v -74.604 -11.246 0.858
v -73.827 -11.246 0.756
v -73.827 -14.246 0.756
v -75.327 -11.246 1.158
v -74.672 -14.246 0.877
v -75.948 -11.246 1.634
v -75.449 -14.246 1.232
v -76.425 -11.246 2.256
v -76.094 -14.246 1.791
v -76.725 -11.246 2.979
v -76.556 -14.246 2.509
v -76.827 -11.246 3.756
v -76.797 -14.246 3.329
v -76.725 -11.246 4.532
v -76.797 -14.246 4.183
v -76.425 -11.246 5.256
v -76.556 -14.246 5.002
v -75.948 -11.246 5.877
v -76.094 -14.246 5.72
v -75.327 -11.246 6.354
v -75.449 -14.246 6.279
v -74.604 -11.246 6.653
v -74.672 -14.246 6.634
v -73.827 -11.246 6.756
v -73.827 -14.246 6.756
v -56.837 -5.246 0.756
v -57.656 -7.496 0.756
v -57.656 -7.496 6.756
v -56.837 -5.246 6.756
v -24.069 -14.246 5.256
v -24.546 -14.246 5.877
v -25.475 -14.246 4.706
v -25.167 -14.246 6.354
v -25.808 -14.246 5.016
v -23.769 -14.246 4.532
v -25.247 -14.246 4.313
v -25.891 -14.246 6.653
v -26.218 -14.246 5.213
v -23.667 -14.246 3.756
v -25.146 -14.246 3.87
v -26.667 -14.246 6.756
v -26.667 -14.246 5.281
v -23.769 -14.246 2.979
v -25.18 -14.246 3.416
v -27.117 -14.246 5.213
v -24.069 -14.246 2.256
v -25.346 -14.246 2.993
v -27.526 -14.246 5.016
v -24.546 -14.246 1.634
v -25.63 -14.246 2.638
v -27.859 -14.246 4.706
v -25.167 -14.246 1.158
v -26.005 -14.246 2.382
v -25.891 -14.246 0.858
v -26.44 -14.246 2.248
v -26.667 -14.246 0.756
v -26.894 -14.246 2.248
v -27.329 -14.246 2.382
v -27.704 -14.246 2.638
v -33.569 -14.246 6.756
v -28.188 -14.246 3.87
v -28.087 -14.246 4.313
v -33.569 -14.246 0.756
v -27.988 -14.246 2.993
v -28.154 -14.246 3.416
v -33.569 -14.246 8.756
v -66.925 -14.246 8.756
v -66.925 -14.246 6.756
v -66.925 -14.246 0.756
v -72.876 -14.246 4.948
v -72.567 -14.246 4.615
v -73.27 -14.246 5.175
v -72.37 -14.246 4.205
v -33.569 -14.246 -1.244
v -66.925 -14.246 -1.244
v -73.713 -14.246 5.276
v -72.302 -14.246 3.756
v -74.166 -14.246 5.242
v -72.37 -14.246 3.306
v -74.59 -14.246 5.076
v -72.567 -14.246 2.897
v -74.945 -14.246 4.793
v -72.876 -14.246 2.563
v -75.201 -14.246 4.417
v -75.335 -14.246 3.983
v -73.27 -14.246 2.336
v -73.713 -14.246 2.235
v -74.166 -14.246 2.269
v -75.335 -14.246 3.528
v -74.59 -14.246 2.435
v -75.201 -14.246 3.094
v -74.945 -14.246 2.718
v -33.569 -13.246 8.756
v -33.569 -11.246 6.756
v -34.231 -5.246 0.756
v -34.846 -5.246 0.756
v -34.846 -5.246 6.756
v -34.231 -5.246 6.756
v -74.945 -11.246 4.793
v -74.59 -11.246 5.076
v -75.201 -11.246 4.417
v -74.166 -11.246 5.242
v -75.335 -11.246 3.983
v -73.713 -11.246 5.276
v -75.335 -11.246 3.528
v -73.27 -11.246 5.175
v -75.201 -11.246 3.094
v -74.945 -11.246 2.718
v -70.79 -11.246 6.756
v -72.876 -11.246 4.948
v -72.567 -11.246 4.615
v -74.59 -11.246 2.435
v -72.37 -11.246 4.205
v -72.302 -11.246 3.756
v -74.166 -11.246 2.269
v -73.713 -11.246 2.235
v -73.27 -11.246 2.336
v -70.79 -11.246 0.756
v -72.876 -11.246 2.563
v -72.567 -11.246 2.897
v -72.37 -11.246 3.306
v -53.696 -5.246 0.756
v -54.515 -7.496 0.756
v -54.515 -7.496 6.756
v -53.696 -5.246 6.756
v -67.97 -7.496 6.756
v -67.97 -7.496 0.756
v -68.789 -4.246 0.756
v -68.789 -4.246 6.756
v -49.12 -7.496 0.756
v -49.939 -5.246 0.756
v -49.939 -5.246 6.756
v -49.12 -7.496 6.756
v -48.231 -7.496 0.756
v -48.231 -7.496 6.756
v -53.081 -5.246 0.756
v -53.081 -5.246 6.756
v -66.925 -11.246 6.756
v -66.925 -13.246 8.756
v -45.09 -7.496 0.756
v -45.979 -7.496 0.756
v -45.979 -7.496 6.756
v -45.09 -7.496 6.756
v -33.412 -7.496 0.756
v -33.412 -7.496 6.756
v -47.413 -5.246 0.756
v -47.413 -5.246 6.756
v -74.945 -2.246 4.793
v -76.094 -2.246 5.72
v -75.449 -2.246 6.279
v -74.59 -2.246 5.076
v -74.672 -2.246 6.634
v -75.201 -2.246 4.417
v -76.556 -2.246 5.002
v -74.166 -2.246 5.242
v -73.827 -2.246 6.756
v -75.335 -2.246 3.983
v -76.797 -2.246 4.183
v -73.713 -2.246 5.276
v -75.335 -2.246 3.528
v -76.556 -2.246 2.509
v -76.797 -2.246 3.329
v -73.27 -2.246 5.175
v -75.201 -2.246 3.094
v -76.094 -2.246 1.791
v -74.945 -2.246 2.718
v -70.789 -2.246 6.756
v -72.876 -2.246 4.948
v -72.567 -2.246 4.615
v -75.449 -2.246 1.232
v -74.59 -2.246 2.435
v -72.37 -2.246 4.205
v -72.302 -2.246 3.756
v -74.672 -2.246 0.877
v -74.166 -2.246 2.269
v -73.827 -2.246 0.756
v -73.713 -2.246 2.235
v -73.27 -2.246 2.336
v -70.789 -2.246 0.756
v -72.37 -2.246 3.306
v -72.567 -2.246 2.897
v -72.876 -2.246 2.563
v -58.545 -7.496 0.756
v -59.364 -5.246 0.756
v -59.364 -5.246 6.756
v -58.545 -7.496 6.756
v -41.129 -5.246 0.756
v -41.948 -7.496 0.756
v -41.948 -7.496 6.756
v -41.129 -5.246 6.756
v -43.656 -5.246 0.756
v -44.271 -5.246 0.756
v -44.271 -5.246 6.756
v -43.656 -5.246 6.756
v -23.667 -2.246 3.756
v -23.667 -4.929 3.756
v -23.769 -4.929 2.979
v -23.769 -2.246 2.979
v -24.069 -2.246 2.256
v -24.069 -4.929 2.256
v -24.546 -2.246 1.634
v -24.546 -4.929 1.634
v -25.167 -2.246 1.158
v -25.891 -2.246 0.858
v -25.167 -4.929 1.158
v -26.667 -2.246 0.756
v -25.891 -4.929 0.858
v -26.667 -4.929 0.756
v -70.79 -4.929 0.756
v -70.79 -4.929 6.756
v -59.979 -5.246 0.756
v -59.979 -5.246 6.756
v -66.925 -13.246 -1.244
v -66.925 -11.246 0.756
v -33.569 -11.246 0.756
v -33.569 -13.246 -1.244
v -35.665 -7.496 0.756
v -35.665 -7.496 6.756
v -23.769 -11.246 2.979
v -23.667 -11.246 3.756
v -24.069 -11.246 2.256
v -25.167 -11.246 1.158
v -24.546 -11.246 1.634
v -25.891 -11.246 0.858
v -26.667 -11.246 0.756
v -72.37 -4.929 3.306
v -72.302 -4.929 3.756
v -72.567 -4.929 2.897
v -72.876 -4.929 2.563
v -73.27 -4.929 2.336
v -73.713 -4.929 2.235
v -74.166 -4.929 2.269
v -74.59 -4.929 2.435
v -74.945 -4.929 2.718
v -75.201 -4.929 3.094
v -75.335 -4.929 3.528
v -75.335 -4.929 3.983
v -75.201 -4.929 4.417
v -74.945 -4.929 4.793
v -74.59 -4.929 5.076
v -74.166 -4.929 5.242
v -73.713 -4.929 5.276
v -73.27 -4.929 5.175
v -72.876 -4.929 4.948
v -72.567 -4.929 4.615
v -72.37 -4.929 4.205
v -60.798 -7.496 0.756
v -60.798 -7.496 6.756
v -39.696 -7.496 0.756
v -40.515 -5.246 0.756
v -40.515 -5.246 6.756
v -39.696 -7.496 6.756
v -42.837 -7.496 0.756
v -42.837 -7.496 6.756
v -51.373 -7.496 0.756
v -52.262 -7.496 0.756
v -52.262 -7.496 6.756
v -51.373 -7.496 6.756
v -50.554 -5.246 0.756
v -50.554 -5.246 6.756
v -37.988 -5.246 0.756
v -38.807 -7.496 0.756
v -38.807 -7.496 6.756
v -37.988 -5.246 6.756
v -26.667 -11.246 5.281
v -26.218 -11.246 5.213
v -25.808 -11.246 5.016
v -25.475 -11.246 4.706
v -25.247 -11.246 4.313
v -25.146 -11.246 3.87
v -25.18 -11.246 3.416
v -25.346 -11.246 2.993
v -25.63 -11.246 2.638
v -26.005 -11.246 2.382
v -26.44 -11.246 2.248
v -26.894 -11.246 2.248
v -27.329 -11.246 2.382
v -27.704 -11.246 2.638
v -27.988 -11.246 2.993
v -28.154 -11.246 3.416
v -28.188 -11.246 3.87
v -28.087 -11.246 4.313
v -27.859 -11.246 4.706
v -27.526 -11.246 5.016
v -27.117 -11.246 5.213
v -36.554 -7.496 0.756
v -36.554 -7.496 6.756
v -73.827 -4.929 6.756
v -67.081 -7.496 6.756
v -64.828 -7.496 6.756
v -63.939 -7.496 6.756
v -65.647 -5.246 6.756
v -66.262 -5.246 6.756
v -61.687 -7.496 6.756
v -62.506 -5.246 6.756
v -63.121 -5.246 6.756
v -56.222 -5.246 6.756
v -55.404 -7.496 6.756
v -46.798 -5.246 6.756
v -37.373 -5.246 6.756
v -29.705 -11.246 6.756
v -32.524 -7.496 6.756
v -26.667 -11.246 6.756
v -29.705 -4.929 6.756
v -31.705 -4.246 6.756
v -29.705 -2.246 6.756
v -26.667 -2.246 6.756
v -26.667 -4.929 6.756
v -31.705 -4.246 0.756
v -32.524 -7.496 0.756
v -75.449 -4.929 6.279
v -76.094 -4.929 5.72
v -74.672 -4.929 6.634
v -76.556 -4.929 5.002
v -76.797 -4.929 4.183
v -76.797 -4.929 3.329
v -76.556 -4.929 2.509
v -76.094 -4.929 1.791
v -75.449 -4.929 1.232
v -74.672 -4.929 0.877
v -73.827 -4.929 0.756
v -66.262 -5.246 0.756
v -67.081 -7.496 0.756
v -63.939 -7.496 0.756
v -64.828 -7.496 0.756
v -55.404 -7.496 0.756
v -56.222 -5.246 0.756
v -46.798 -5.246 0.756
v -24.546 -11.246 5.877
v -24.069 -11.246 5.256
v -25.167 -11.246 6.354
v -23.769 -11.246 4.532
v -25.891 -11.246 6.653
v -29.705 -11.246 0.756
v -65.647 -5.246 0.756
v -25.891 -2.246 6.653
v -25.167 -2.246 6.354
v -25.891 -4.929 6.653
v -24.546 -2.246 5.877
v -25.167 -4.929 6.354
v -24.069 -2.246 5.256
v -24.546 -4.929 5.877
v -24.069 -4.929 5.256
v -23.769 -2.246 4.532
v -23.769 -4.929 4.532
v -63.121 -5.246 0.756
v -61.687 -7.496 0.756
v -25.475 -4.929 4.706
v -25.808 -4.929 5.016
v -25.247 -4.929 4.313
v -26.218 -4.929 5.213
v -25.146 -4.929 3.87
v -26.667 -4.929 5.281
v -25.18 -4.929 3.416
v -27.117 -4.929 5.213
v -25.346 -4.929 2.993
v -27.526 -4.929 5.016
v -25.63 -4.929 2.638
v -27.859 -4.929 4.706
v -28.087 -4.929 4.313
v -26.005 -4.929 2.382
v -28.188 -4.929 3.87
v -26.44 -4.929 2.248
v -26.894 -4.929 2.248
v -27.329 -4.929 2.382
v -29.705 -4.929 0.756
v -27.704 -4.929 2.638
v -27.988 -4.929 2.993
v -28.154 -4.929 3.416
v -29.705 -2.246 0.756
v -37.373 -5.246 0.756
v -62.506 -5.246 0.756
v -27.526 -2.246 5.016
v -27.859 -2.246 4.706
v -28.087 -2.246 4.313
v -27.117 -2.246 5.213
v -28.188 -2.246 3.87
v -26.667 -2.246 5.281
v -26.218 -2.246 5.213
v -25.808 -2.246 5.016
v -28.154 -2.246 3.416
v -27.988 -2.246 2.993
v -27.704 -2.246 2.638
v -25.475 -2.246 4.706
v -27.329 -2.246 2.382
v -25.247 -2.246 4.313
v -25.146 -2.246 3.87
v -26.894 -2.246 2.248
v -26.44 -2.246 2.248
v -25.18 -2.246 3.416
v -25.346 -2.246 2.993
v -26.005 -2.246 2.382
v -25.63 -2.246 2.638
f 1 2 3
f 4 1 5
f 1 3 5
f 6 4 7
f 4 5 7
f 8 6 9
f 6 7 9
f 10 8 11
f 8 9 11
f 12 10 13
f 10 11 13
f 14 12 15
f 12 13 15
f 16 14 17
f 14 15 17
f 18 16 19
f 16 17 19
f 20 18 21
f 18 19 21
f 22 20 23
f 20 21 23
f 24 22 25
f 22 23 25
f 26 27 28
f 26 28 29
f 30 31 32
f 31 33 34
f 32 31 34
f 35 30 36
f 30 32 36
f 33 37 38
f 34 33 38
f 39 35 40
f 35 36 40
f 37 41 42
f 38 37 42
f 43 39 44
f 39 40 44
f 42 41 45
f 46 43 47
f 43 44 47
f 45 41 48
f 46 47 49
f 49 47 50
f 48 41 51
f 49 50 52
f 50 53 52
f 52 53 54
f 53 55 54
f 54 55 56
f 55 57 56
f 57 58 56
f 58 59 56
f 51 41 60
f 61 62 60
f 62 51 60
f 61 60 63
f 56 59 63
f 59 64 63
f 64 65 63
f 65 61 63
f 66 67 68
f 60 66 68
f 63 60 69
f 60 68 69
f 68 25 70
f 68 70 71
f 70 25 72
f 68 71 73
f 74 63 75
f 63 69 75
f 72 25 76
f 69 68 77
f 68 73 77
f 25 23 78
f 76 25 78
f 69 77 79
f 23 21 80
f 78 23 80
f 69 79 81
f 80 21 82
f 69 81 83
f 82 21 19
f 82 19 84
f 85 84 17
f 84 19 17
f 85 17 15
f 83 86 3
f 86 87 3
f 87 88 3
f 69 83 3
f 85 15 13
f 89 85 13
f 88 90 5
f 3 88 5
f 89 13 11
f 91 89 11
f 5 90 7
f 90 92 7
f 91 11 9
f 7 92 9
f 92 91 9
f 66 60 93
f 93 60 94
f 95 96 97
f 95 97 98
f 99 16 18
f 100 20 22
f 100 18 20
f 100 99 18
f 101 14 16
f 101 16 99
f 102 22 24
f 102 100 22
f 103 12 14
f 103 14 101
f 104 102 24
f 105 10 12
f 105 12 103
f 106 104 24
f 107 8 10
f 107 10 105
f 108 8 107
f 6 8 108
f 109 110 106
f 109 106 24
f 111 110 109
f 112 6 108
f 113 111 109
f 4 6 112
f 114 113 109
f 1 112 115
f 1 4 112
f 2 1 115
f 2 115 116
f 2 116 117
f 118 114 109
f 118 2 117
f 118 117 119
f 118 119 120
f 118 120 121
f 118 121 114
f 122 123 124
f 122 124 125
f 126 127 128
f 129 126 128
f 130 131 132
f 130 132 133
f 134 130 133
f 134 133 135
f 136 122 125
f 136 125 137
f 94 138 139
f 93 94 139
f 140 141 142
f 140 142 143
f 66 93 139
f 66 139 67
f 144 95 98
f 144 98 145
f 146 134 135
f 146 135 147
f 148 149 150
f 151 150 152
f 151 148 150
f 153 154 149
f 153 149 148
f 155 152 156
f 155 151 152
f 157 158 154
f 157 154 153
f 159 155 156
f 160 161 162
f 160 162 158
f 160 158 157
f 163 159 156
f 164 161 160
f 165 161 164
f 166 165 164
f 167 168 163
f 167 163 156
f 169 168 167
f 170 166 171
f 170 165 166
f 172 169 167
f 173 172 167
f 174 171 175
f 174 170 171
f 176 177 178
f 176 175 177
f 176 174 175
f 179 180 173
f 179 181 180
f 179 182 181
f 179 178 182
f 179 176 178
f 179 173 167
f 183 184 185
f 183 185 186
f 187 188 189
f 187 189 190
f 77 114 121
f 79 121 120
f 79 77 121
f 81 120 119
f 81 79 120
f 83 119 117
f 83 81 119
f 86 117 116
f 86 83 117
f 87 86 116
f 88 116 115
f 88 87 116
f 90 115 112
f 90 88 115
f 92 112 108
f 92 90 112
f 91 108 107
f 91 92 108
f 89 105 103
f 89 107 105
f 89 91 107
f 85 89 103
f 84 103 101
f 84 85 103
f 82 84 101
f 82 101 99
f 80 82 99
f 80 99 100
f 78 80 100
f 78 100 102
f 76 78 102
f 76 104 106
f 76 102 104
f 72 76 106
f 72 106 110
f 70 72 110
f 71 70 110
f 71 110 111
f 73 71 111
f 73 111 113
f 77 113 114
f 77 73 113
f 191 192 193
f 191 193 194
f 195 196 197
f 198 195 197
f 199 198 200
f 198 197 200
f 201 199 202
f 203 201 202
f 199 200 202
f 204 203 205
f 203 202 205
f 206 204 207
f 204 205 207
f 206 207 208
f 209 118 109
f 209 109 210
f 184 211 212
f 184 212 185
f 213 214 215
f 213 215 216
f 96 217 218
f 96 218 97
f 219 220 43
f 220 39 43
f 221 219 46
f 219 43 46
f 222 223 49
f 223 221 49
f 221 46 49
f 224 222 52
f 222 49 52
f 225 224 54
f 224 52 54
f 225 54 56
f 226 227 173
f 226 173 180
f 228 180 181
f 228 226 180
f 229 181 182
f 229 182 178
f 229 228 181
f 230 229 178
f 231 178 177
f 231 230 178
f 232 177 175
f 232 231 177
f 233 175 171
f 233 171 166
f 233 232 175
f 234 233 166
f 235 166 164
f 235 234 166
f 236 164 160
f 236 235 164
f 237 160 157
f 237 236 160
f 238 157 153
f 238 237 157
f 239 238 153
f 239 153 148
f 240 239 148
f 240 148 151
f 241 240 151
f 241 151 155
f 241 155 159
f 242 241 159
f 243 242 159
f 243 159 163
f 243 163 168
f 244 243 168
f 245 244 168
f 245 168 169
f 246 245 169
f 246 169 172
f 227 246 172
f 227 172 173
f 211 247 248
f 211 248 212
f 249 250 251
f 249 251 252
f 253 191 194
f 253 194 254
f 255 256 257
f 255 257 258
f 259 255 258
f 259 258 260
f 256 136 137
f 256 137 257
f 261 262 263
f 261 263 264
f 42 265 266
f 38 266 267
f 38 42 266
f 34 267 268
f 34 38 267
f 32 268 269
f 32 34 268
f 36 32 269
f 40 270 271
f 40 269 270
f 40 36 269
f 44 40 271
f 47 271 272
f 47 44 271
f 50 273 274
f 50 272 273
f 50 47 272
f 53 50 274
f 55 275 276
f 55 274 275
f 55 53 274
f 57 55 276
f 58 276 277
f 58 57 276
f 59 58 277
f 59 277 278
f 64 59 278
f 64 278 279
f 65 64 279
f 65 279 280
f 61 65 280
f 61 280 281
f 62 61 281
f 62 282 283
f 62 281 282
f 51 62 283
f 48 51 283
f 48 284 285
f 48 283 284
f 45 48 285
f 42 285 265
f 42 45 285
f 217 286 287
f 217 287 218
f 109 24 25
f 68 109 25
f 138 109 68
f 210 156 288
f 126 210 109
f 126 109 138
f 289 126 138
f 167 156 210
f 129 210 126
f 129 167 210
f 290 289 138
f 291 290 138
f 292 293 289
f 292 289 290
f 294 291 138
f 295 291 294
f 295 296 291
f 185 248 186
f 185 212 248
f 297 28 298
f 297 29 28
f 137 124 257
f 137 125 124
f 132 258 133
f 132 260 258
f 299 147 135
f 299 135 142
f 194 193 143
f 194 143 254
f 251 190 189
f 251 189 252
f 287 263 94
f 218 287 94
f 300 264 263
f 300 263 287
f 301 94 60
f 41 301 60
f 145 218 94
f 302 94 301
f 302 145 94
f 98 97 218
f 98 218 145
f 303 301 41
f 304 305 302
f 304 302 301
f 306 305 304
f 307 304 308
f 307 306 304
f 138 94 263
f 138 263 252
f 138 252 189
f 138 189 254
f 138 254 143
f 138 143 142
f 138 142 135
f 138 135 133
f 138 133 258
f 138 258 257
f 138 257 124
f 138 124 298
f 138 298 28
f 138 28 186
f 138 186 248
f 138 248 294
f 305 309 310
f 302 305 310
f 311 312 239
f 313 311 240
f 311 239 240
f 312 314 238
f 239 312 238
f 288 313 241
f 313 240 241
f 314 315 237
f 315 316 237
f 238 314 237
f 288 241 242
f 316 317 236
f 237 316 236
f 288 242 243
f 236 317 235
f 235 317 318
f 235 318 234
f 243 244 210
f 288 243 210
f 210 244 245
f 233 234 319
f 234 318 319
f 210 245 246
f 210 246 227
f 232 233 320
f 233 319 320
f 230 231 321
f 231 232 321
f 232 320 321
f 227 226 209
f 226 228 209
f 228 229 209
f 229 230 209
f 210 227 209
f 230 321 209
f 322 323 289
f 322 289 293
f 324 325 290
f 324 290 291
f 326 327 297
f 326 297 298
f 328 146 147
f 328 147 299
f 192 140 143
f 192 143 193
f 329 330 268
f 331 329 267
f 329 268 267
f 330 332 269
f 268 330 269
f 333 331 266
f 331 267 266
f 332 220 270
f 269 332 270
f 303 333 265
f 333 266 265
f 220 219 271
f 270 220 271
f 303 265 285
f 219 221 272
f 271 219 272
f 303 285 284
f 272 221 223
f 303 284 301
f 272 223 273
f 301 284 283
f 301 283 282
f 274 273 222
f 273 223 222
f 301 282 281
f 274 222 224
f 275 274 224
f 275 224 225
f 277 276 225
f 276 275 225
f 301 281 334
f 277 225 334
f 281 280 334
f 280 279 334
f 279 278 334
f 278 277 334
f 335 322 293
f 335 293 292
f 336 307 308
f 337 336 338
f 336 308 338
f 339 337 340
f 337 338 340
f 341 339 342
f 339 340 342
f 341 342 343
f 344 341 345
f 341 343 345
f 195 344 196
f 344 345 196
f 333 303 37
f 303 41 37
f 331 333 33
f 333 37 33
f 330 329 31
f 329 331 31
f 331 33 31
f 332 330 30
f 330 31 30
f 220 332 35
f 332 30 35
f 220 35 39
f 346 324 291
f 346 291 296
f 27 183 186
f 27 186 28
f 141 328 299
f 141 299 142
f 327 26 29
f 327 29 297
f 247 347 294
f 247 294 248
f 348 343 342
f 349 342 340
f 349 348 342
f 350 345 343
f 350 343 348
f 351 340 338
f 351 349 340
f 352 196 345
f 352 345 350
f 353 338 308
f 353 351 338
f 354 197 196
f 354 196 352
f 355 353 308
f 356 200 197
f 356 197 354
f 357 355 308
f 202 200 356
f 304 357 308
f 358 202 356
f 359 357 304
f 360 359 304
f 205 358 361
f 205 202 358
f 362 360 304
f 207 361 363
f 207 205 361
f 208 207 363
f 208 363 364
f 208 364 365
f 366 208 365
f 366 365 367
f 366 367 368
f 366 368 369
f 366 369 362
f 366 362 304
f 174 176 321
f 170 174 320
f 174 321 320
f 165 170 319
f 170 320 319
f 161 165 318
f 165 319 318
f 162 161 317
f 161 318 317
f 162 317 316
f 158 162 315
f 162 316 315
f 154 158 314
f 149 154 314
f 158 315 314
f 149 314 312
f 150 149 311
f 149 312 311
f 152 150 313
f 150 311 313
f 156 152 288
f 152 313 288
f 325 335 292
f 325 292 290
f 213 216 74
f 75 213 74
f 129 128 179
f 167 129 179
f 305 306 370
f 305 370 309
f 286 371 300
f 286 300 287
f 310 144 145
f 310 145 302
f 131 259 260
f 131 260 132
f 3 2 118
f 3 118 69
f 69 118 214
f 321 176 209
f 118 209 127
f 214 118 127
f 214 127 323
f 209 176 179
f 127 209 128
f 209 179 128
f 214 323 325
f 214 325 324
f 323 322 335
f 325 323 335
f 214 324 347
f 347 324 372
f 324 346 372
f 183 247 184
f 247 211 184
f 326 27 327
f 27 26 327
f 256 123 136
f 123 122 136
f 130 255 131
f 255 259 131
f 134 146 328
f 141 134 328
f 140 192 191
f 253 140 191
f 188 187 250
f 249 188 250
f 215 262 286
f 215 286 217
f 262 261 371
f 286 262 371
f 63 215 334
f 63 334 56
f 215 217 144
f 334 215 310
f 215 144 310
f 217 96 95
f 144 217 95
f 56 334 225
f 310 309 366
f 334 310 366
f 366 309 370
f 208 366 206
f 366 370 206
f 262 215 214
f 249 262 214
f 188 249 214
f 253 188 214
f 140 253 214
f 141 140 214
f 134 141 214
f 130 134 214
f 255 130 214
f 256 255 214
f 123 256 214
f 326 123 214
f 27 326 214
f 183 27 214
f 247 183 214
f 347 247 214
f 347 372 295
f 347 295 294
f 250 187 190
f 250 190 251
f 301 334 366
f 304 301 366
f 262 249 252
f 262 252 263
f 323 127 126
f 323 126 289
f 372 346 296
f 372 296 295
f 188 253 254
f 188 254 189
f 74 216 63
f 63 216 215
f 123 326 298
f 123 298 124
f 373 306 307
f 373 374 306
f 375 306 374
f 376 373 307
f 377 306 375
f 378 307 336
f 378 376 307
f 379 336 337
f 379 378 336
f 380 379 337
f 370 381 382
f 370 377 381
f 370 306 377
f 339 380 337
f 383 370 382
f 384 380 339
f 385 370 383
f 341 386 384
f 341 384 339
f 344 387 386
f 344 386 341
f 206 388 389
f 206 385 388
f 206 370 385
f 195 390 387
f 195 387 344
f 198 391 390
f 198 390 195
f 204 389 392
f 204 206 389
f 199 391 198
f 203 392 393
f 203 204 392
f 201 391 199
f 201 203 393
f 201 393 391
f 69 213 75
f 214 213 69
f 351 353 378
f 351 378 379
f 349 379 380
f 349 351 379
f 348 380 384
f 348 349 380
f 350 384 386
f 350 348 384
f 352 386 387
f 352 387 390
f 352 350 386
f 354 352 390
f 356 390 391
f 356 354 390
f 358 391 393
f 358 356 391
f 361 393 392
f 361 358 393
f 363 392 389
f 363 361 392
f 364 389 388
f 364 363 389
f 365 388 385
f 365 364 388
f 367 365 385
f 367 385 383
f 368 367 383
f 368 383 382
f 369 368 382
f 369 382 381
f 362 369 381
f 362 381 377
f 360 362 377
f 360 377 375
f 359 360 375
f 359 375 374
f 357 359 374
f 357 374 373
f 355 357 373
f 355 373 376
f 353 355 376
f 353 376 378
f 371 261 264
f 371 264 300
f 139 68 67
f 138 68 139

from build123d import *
from build123d.topology import SkipClean

# Parameters (mm, degrees)
BOSS_EXTRUDE1_DEPTH  = 6
SKETCH2_W            = 6
SKETCH2_H            = 6
SKETCH2_R            = 1.525
BOSS_EXTRUDE2_DEPTH  = 3.75
FILLET1_R            = 3
SKETCH4_W            = 33.355842528
SKETCH4_H            = 6
BOSS_EXTRUDE3_DEPTH  = 3
BOSS_EXTRUDE4_DEPTH  = 33.355842528
BOSS_EXTRUDE5_START  = -6.75
SKETCH7_R            = 1.525
BOSS_EXTRUDE5_DEPTH  = 12
SKETCH8_W            = 6
SKETCH8_H            = 5.25
BOSS_EXTRUDE6_DEPTH  = 1.433789
BOSS_EXTRUDE7_REACH  = 51.468
SKETCH11_W           = 6
SKETCH11_H           = 3
MIRROR1_START        = -14.24613882
MIRROR1_OUTLINE_R    = 1.525
MIRROR1_DEPTH        = 12
SKETCH13_W           = 6
SKETCH13_H           = 5.25
BOSS_EXTRUDE8_DEPTH  = 1.434493
BOSS_EXTRUDE9_REACH  = 51.468
SKETCH14_W           = 6
SKETCH14_H           = 3
CHAMFER1_SIZE        = 2
SKETCH15_W           = 7.967920834
SKETCH15_H           = 6.3175
CUT_EXTRUDE1_DEPTH   = 6.25
BOSS_EXTRUDE10_DEPTH = 6


# Read off the part's stored shape, not the designer's step: Mirror1
# Some blends are built 0.0001 mm under size
with BuildPart() as part:
    # Sketch1 → Boss-Extrude1 (new body)
    with BuildSketch(Plane(origin=(0, 0, 0.755649514), x_dir=(-1, 0, 0), z_dir=(0, 0, -1))):
        Polygon((31.089725273, -5.24613882), (30.270792245, -7.49613882), (29.667061326, -7.49613882), (29.667061326, -11.24613882), (70.667061326, -11.24613882), (70.827061326, -11.24613882), (70.827061326, -7.49613882), (70.667061326, -7.49613882), (70.222625956, -7.49613882), (69.403692929, -5.24613882), (68.788837073, -5.24613882), (67.969904045, -7.49613882), (67.081033306, -7.49613882), (66.262100279, -5.24613882), (65.647244423, -5.24613882), (64.828311395, -7.49613882), (63.939440656, -7.49613882), (63.120507629, -5.24613882), (62.505651773, -5.24613882), (61.686718745, -7.49613882), (60.797848006, -7.49613882), (59.978914979, -5.24613882), (59.364059123, -5.24613882), (58.545126095, -7.49613882), (57.656255356, -7.49613882), (56.837322329, -5.24613882), (56.222466473, -5.24613882), (55.403533445, -7.49613882), (54.514662706, -7.49613882), (53.695729679, -5.24613882), (53.080873823, -5.24613882), (52.261940795, -7.49613882), (51.373070056, -7.49613882), (50.554137029, -5.24613882), (49.939281173, -5.24613882), (49.120348145, -7.49613882), (48.231477406, -7.49613882), (47.412544379, -5.24613882), (46.797688523, -5.24613882), (45.978755495, -7.49613882), (45.089884756, -7.49613882), (44.270951729, -5.24613882), (43.656095873, -5.24613882), (42.837162845, -7.49613882), (41.948292106, -7.49613882), (41.129359079, -5.24613882), (40.514503223, -5.24613882), (39.695570195, -7.49613882), (38.806699456, -7.49613882), (37.987766429, -5.24613882), (37.372910573, -5.24613882), (36.553977545, -7.49613882), (35.665106806, -7.49613882), (34.846173779, -5.24613882), (34.231317923, -5.24613882), (33.412384895, -7.49613882), (32.523514156, -7.49613882), (31.704581129, -5.24613882), align=None)
    extrude(amount=-BOSS_EXTRUDE1_DEPTH)

    # Sketch2 → Boss-Extrude2 (add)
    # profile 1 of 2: a face of its own
    with BuildSketch(Plane.XZ.offset(11.24613882)):
        with Locations((-73.827061326, 3.755649514)):
            Rectangle(SKETCH2_W, SKETCH2_H)
        with Locations(Location((-73.827061326, 3.755649514, 0), (0, 0, 270))):
            Circle(SKETCH2_R, mode=Mode.SUBTRACT)
    # profile 2 of 2: a face of its own
    with BuildSketch(Plane.XZ.offset(11.24613882)):
        with Locations((-26.667061326, 3.755649514)):
            Rectangle(SKETCH2_W, SKETCH2_H)
        with Locations(Location((-26.667061326, 3.755649514, 0), (0, 0, 270))):
            Circle(SKETCH2_R, mode=Mode.SUBTRACT)
    extrude(amount=-BOSS_EXTRUDE2_DEPTH)

    # Fillet1
    fillet1_edges = [part.edges().sort_by_distance(p)[0] for p in [
        (-23.667061326, -9.37113882, 0.755649514),
        (-23.667061326, -9.37113882, 6.755649514),
        (-76.827061326, -9.37113882, 6.755649514),
        (-76.827061326, -9.37113882, 0.755649514),
    ]]
    fillet(fillet1_edges, radius=FILLET1_R - 0.0001)  # a hair under: the kernel refuses the full size

    # Sketch4 → Boss-Extrude3 (add)
    with BuildSketch(Plane.XZ.offset(11.24613882)):
        with Locations((-50.247061326, 3.755649514)):
            Rectangle(SKETCH4_W, SKETCH4_H)
    extrude(amount=BOSS_EXTRUDE3_DEPTH)

    # Sketch5 → Boss-Extrude4 (add)
    with BuildSketch(Plane.ZY.offset(66.92498259)):
        Polygon((0.755649514, -11.24613882), (-1.244350486, -13.24613882), (-1.244350486, -14.24613882), (0.755649514, -14.24613882), align=None)
        Polygon((8.755649514, -13.24613882), (8.755649514, -14.24613882), (6.755649514, -14.24613882), (6.755649514, -11.24613882), align=None)
    extrude(amount=-BOSS_EXTRUDE4_DEPTH)

    # Sketch7 → Boss-Extrude5 (add)
    with BuildSketch(Plane(origin=(0, -7.49613882, 0), x_dir=(1, 0, 0), z_dir=(0, 1, 0)).offset(BOSS_EXTRUDE5_START)):
        with BuildLine():
            Line((-26.667061326, -0.755649514), (-30.270792245, -0.755649514))
            Line((-30.270792245, -0.755649514), (-30.270792245, -6.755649514))
            Line((-30.270792245, -6.755649514), (-26.667061326, -6.755649514))
            ThreePointArc((-26.667061326, -6.755649514), (-24.545740982, -5.876969858), (-23.667061326, -3.755649514))
            ThreePointArc((-23.667061326, -3.755649514), (-24.545740982, -1.634329171), (-26.667061326, -0.755649514))
        make_face()
        with Locations(Location((-26.667061326, -3.755649514, 0), (0, 0, 270))):
            Circle(SKETCH7_R, mode=Mode.SUBTRACT)
    extrude(amount=BOSS_EXTRUDE5_DEPTH)

    # Sketch8 → Boss-Extrude6 (add)
    with BuildSketch(Plane.ZY.offset(30.270792245)):
        with Locations((3.755649514, -4.87113882)):
            Rectangle(SKETCH8_W, SKETCH8_H)
    extrude(amount=BOSS_EXTRUDE6_DEPTH)

    # Sketch11 → Boss-Extrude7 (add, up to next)
    with BuildSketch(Plane.ZY.offset(30.270792245), mode=Mode.PRIVATE) as boss_extrude7_sk1:
        with Locations((3.755649514, -12.74613882)):
            Rectangle(SKETCH11_W, SKETCH11_H)
    boss_extrude7_tool1 = extrude(boss_extrude7_sk1.sketch, amount=BOSS_EXTRUDE7_REACH, mode=Mode.PRIVATE) - part.part
    add(boss_extrude7_tool1.solids().sort_by_distance((-30.270792, -12.746139, 3.75565))[0])

    # Mirror1 outline → Mirror1 (add)
    with SkipClean():  # the faces are left unmerged after this step: merging them gives an invalid solid
        with BuildSketch(Plane(origin=(0, 0, 0), x_dir=(1, 0, 0), z_dir=(0, 1, 0)).offset(MIRROR1_START)):
            with BuildLine():
                ThreePointArc((-73.827061326, -0.755649514), (-76.827061326, -3.755649514), (-73.827061326, -6.755649514))
                Line((-73.827061326, -6.755649514), (-70.223330406, -6.755649514))
                Line((-70.223330406, -6.755649514), (-70.223330406, -0.755649514))
                Line((-70.223330406, -0.755649514), (-73.827061326, -0.755649514))
            make_face()
            with Locations((-73.827061326, -3.755649514)):
                Circle(MIRROR1_OUTLINE_R, mode=Mode.SUBTRACT)
        extrude(amount=MIRROR1_DEPTH)

    # Sketch13 → Boss-Extrude8 (add)
    with SkipClean():  # the faces are left unmerged after this step: merging them gives an invalid solid
        with BuildSketch(Plane(origin=(-70.223330406, 0, 0), x_dir=(0, 0, -1), z_dir=(1, 0, 0))):
            with Locations((-3.755649514, -4.87113882)):
                Rectangle(SKETCH13_W, SKETCH13_H)
        extrude(amount=BOSS_EXTRUDE8_DEPTH)

    # Sketch14 → Boss-Extrude9 (add, up to next)
    with BuildSketch(Plane(origin=(-70.223330406, 0, 0), x_dir=(0, 0, -1), z_dir=(1, 0, 0)), mode=Mode.PRIVATE) as boss_extrude9_sk1:
        with Locations((-3.755649514, -12.74613882)):
            Rectangle(SKETCH14_W, SKETCH14_H)
    boss_extrude9_tool1 = extrude(boss_extrude9_sk1.sketch, amount=BOSS_EXTRUDE9_REACH, mode=Mode.PRIVATE) - part.part
    add(boss_extrude9_tool1.solids().sort_by_distance((-70.22333, -12.746139, 3.75565))[0])

    # Chamfer1
    # the kernel refuses this chamfer: 2 mm, written as the material it takes off along each edge
    with BuildSketch(Plane(origin=(-31.704581245, -2.24613882, 11.89901549), x_dir=(0.9996219169112968, 0.027495876610586296, 0), z_dir=(0, 0, -1))) as chamfer1_piece_1:
        Polygon((CHAMFER1_SIZE * 0.999621916911, CHAMFER1_SIZE * 0.0274958766106), (-CHAMFER1_SIZE * 0.0274958766106, CHAMFER1_SIZE * 0.999621916911), (0, 0), align=None)
    extrude(amount=16.286731952, mode=Mode.SUBTRACT)
    with BuildSketch(Plane(origin=(-68.788837406, -2.24613882, -4.387716461), x_dir=(0.027495876610589064, -0.9996219169112965, 0), z_dir=(0, 0, 1))) as chamfer1_piece_2:
        Polygon((CHAMFER1_SIZE * 0.999621916911, -CHAMFER1_SIZE * 0.0274958766106), (-CHAMFER1_SIZE * 0.0274958766106, -CHAMFER1_SIZE * 0.999621916911), (0, 0), align=None)
    extrude(amount=16.286731952, mode=Mode.SUBTRACT)

    # Sketch15 → Cut-Extrude1 (cut)
    with BuildSketch(Plane(origin=(0, 0, 0.755649514), x_dir=(-1, 0, 0), z_dir=(0, 0, -1))):
        with Locations((25.720620712, -8.08738882)):
            Rectangle(SKETCH15_W, SKETCH15_H)
    cut_extrude1 = extrude(amount=-CUT_EXTRUDE1_DEPTH, mode=Mode.SUBTRACT)

    # Mirror2: Cut-Extrude1 across plane
    add(cut_extrude1.mirror(Plane(origin=(-50.247061326, 0, 0), x_dir=(0, 0, 1), z_dir=(1, 0, 0))), mode=Mode.SUBTRACT)

    # Sketch16 → Boss-Extrude10 (add)
    with BuildSketch(Plane(origin=(0, 0, 0.755649514), x_dir=(-1, 0, 0), z_dir=(0, 0, -1))):
        Polygon((67.969904045, -7.49613882), (68.788837073, -4.24613882), (68.788837073, -7.702493067), align=None)
        Polygon((31.704581129, -4.24613882), (32.523514156, -7.49613882), (31.704581129, -7.702493067), align=None)
    extrude(amount=-BOSS_EXTRUDE10_DEPTH)


solid = part.part
